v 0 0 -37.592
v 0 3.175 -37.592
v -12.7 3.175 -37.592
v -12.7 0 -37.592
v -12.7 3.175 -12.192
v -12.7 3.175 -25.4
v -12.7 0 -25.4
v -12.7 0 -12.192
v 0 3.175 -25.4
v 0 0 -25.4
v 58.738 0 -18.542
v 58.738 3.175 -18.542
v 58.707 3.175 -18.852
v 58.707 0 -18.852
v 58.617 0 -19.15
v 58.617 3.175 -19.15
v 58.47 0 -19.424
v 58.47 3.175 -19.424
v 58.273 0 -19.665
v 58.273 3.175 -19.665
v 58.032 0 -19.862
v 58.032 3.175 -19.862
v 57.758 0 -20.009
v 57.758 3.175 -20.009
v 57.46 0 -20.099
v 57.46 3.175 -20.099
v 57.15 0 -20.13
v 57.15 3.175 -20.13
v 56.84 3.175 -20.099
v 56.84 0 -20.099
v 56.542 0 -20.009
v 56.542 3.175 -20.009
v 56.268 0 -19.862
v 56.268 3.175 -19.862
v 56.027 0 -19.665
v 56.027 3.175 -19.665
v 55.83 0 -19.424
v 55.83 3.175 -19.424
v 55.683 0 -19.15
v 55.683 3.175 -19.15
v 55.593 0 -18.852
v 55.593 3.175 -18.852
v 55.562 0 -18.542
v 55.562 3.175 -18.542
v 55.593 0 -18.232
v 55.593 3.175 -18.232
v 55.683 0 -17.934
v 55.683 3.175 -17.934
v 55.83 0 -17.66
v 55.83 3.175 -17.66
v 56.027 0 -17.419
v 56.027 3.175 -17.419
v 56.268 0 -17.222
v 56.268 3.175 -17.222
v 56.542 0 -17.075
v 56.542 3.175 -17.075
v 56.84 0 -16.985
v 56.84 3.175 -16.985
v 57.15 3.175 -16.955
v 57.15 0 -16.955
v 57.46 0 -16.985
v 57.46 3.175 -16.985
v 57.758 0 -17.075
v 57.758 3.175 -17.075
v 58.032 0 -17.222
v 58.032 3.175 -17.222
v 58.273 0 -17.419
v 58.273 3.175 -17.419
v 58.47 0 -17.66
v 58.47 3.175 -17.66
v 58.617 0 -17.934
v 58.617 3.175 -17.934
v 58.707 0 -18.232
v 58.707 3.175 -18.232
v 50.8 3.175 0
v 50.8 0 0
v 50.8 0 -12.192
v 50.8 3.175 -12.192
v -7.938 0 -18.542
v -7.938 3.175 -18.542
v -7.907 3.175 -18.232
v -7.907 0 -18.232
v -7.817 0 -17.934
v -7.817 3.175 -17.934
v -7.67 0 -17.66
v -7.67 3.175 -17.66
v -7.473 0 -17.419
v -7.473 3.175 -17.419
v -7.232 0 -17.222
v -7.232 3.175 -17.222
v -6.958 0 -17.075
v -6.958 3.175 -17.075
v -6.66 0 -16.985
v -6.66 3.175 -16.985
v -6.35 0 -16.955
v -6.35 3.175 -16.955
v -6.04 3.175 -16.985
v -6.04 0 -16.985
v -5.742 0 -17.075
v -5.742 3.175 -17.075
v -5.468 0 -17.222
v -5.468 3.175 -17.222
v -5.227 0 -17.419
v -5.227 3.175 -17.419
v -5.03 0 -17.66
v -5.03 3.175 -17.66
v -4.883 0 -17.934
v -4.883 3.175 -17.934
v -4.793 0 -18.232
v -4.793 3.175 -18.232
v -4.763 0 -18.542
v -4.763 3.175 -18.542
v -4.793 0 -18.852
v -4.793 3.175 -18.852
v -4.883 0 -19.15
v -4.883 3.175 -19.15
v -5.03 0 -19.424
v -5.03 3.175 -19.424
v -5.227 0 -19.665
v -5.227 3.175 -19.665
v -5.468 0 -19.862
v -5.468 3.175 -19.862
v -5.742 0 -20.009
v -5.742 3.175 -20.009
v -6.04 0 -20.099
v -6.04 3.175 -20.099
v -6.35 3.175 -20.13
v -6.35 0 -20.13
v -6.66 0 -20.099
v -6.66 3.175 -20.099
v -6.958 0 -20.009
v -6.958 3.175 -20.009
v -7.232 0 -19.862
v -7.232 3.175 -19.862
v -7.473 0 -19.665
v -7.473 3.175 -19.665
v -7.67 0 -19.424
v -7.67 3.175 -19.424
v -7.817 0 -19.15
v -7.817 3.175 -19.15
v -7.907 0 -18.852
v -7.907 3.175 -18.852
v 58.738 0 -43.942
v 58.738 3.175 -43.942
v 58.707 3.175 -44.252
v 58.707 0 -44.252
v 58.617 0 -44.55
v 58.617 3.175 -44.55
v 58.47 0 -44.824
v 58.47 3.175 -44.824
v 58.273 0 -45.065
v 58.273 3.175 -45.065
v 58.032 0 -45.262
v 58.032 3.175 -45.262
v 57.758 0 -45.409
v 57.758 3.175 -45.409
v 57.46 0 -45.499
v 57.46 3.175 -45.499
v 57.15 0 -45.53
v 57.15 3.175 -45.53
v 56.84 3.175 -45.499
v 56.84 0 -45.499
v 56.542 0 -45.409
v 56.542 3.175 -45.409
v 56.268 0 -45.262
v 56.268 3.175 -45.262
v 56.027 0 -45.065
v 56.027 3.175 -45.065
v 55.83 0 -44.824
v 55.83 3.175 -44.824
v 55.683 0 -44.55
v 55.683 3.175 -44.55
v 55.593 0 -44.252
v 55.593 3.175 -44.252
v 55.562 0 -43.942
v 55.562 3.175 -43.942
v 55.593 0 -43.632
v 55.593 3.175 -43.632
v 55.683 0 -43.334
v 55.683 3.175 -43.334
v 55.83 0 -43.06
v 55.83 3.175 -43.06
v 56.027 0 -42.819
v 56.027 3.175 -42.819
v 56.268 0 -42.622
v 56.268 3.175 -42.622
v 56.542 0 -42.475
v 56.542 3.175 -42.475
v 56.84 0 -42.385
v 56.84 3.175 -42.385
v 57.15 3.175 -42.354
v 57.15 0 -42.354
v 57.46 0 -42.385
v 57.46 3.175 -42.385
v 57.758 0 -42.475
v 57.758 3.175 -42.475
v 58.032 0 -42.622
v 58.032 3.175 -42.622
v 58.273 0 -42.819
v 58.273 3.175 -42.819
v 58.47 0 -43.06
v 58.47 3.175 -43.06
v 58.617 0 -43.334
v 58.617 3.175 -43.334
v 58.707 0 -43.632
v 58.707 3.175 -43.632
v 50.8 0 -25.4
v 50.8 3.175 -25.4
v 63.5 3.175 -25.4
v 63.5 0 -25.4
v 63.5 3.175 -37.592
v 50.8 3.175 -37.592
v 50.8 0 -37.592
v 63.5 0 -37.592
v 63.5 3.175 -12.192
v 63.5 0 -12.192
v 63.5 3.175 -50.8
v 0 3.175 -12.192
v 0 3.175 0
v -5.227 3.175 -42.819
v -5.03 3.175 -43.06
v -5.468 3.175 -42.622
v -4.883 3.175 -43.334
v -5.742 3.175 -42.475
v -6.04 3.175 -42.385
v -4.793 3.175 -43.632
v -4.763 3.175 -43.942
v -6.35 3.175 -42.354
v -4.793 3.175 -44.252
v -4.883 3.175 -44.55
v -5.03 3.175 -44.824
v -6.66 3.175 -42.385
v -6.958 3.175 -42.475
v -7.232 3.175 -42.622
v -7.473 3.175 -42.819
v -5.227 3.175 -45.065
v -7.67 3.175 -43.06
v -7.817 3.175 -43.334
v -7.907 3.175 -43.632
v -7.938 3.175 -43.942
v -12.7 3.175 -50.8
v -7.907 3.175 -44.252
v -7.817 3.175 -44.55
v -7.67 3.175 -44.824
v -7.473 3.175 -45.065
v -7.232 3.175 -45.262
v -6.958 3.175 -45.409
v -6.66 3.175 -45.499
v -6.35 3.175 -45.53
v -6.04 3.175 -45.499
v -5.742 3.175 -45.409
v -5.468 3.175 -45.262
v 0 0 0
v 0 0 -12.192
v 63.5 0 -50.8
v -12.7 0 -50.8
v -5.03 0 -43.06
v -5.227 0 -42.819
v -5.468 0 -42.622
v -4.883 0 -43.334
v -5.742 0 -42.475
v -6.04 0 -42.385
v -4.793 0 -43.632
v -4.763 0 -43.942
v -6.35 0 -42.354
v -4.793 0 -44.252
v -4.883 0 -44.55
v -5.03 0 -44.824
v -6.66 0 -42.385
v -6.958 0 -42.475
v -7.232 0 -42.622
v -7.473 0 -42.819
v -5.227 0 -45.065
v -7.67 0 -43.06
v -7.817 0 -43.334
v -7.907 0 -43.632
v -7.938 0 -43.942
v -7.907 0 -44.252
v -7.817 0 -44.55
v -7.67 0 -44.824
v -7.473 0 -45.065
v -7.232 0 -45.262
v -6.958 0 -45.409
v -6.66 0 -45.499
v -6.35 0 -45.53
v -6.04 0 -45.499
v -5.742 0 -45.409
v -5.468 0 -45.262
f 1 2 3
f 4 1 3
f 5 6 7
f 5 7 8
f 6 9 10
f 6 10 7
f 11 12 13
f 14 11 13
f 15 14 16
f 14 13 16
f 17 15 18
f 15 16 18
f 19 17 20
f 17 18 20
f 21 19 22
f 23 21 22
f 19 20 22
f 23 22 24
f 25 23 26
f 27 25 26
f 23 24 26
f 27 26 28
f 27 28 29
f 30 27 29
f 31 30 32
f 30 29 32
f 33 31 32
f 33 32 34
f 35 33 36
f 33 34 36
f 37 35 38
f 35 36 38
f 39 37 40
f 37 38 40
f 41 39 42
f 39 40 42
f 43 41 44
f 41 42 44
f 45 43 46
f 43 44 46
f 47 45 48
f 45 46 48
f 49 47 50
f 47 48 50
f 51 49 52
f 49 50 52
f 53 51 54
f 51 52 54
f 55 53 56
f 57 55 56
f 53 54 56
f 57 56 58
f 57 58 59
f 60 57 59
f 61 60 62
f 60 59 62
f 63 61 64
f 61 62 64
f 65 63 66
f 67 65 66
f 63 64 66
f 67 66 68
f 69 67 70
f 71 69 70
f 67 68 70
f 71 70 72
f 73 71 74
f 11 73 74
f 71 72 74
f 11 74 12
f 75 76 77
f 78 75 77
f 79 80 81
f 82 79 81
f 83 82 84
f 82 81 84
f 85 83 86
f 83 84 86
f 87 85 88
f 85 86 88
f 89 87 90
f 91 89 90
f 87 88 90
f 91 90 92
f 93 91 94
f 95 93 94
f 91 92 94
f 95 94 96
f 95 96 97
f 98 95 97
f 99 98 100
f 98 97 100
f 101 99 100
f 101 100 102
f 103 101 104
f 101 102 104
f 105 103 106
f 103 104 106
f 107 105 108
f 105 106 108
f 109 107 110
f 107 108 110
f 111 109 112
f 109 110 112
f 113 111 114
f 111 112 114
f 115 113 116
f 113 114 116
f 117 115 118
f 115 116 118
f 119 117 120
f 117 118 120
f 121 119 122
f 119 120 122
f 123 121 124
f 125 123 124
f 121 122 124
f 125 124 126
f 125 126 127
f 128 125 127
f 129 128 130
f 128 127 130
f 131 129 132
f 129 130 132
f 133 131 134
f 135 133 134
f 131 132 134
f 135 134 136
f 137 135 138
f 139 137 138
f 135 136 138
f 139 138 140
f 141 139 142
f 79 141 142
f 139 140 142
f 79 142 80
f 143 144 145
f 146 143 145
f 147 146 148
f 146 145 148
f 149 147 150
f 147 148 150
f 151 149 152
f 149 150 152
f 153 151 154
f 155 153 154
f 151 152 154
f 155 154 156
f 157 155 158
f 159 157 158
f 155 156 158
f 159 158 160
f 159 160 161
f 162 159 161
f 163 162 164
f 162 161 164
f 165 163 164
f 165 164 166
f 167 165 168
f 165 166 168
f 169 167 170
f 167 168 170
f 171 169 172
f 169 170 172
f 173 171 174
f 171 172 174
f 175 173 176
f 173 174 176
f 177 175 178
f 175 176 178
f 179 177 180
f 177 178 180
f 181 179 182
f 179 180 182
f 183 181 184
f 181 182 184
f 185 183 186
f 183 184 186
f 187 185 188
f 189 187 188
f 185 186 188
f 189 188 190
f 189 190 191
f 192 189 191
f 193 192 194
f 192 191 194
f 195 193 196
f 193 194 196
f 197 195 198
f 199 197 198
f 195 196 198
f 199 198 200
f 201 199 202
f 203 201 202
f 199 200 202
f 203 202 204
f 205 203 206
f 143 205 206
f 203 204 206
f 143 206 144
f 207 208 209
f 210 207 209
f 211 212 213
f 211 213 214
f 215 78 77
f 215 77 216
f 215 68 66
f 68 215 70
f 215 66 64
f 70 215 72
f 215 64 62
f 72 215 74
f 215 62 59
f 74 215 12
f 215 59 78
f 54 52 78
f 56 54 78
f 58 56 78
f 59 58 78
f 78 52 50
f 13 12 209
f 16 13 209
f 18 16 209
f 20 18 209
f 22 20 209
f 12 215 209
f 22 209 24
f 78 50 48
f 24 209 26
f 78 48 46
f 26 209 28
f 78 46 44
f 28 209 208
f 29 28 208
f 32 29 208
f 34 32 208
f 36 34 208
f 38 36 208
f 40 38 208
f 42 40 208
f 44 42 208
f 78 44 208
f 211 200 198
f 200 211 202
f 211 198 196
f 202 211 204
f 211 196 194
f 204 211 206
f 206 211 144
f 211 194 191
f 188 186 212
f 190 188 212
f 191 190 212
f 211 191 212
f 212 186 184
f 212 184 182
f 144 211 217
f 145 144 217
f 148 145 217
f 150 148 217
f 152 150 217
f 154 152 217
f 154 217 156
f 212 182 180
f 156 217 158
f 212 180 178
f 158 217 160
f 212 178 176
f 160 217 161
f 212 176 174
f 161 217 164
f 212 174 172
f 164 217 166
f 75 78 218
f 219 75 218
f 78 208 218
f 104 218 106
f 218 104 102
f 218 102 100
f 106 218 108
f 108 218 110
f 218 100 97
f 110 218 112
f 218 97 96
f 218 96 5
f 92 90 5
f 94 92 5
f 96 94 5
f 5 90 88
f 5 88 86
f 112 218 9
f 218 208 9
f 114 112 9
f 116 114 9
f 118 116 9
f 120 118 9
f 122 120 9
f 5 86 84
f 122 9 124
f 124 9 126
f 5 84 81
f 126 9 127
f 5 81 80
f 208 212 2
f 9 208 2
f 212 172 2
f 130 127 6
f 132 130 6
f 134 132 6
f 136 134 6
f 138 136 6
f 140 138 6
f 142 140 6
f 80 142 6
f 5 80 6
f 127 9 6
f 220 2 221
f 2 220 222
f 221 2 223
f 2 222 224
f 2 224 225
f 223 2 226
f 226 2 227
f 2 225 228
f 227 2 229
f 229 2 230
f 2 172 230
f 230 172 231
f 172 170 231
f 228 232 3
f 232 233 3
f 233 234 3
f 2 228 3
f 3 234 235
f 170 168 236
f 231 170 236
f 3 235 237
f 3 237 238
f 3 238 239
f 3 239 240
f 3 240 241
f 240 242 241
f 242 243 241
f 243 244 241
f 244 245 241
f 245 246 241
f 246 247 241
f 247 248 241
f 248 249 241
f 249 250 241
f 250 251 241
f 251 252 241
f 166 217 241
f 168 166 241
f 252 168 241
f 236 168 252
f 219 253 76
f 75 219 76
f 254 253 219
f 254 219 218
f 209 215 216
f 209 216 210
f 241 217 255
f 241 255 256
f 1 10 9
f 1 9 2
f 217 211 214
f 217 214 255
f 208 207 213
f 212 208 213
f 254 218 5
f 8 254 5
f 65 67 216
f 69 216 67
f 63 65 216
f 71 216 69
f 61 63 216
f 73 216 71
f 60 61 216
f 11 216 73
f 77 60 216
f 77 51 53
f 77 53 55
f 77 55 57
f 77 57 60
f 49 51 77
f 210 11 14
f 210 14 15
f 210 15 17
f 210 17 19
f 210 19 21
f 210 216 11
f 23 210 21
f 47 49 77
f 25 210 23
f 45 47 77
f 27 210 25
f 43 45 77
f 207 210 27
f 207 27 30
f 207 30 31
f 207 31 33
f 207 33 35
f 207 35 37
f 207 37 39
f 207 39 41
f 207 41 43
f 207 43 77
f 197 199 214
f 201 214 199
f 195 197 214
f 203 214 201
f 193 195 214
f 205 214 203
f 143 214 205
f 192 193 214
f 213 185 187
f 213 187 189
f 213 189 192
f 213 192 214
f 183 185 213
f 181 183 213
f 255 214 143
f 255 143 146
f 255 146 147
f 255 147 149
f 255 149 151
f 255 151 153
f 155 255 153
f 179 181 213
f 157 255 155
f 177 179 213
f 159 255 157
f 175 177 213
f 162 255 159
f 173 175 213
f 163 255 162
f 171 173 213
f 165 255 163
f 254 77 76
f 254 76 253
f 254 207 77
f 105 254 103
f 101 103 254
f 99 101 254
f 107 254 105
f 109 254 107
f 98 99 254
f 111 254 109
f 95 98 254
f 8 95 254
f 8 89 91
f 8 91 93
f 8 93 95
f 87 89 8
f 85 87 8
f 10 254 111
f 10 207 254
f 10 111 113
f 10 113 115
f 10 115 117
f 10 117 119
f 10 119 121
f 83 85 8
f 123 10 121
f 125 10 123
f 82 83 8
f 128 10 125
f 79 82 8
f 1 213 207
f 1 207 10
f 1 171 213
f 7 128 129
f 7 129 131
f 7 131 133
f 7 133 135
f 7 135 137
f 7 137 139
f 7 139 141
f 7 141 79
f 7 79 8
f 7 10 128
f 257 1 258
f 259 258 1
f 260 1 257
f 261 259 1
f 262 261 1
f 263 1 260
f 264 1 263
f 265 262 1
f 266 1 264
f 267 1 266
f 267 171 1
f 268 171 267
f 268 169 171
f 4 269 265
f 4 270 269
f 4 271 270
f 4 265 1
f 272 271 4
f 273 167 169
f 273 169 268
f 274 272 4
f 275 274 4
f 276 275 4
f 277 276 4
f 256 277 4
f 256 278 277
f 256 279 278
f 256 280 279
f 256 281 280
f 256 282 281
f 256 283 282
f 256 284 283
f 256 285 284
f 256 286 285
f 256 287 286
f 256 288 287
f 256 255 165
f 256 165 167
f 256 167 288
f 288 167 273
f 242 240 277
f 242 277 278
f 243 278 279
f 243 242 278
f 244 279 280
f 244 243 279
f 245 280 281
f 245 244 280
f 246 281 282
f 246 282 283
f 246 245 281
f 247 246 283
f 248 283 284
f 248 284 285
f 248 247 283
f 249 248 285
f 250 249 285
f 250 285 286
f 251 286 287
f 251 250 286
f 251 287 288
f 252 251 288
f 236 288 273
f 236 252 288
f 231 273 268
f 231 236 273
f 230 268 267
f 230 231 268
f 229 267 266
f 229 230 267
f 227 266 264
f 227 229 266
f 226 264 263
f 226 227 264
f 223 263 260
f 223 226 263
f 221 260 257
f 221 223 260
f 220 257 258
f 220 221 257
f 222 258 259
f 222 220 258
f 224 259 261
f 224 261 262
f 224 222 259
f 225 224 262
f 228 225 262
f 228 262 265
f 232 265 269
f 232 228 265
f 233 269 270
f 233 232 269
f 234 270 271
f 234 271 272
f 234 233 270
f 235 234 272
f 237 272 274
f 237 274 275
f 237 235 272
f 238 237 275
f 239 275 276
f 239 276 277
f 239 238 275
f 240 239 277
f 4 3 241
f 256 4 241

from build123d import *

# Parameters (mm, degrees)
SKETCH1_W               = 50.8
SKETCH1_H               = 50.8
BOSS_EXTRUDE1_DEPTH     = 3.175
SKETCH2_W               = 12.7
SKETCH2_H               = 13.208
SKETCH2_R               = 1.5875
BOSS_EXTRUDE2_DEPTH     = 3.175
LPATTERN1_COUNT         = 2
LPATTERN1_PITCH         = 25.4
MIRROR1_COPY_1_SKETCH_W = 12.7
MIRROR1_COPY_1_SKETCH_H = 13.208
MIRROR1_COPY_1_SKETCH_R = 1.5875
MIRROR1_COPY_1_DEPTH    = 3.175


with BuildPart() as part:
    # Sketch1 → Boss-Extrude1 (new body)
    with BuildSketch(Plane(origin=(0, 0, 0), x_dir=(1, 0, 0), z_dir=(0, 1, 0))):
        with Locations((25.4, 25.4)):
            Rectangle(SKETCH1_W, SKETCH1_H)
    extrude(amount=BOSS_EXTRUDE1_DEPTH)

    # Sketch2 → Boss-Extrude2 (add)
    with BuildSketch(Plane(origin=(0, 3.175, 0), x_dir=(1, 0, 0), z_dir=(0, 1, 0))):
        with Locations((57.15, 44.196)):
            Rectangle(SKETCH2_W, SKETCH2_H)
        with Locations((57.15, 43.942)):
            Circle(SKETCH2_R, mode=Mode.SUBTRACT)
    boss_extrude2 = extrude(amount=-BOSS_EXTRUDE2_DEPTH)

    # LPattern1: Boss-Extrude2 ×2
    with Locations(*[(0, 0, i * LPATTERN1_PITCH) for i in range(1, LPATTERN1_COUNT)]):
        add(boss_extrude2)

    # Mirror1: Boss-Extrude2 across plane
    add(boss_extrude2.mirror(Plane.ZY.offset(-25.4)))

    # Mirror1 copy 1 sketch → Mirror1 copy 1 (add)
    with BuildSketch(Plane(origin=(50.8, 3.175, 25.4), x_dir=(-1, 0, 0), z_dir=(0, 1, 0))):
        with Locations((57.15, -44.196)):
            Rectangle(MIRROR1_COPY_1_SKETCH_W, MIRROR1_COPY_1_SKETCH_H)
        with Locations((57.15, -43.942)):
            Circle(MIRROR1_COPY_1_SKETCH_R, mode=Mode.SUBTRACT)
    extrude(amount=-MIRROR1_COPY_1_DEPTH)


solid = part.part
